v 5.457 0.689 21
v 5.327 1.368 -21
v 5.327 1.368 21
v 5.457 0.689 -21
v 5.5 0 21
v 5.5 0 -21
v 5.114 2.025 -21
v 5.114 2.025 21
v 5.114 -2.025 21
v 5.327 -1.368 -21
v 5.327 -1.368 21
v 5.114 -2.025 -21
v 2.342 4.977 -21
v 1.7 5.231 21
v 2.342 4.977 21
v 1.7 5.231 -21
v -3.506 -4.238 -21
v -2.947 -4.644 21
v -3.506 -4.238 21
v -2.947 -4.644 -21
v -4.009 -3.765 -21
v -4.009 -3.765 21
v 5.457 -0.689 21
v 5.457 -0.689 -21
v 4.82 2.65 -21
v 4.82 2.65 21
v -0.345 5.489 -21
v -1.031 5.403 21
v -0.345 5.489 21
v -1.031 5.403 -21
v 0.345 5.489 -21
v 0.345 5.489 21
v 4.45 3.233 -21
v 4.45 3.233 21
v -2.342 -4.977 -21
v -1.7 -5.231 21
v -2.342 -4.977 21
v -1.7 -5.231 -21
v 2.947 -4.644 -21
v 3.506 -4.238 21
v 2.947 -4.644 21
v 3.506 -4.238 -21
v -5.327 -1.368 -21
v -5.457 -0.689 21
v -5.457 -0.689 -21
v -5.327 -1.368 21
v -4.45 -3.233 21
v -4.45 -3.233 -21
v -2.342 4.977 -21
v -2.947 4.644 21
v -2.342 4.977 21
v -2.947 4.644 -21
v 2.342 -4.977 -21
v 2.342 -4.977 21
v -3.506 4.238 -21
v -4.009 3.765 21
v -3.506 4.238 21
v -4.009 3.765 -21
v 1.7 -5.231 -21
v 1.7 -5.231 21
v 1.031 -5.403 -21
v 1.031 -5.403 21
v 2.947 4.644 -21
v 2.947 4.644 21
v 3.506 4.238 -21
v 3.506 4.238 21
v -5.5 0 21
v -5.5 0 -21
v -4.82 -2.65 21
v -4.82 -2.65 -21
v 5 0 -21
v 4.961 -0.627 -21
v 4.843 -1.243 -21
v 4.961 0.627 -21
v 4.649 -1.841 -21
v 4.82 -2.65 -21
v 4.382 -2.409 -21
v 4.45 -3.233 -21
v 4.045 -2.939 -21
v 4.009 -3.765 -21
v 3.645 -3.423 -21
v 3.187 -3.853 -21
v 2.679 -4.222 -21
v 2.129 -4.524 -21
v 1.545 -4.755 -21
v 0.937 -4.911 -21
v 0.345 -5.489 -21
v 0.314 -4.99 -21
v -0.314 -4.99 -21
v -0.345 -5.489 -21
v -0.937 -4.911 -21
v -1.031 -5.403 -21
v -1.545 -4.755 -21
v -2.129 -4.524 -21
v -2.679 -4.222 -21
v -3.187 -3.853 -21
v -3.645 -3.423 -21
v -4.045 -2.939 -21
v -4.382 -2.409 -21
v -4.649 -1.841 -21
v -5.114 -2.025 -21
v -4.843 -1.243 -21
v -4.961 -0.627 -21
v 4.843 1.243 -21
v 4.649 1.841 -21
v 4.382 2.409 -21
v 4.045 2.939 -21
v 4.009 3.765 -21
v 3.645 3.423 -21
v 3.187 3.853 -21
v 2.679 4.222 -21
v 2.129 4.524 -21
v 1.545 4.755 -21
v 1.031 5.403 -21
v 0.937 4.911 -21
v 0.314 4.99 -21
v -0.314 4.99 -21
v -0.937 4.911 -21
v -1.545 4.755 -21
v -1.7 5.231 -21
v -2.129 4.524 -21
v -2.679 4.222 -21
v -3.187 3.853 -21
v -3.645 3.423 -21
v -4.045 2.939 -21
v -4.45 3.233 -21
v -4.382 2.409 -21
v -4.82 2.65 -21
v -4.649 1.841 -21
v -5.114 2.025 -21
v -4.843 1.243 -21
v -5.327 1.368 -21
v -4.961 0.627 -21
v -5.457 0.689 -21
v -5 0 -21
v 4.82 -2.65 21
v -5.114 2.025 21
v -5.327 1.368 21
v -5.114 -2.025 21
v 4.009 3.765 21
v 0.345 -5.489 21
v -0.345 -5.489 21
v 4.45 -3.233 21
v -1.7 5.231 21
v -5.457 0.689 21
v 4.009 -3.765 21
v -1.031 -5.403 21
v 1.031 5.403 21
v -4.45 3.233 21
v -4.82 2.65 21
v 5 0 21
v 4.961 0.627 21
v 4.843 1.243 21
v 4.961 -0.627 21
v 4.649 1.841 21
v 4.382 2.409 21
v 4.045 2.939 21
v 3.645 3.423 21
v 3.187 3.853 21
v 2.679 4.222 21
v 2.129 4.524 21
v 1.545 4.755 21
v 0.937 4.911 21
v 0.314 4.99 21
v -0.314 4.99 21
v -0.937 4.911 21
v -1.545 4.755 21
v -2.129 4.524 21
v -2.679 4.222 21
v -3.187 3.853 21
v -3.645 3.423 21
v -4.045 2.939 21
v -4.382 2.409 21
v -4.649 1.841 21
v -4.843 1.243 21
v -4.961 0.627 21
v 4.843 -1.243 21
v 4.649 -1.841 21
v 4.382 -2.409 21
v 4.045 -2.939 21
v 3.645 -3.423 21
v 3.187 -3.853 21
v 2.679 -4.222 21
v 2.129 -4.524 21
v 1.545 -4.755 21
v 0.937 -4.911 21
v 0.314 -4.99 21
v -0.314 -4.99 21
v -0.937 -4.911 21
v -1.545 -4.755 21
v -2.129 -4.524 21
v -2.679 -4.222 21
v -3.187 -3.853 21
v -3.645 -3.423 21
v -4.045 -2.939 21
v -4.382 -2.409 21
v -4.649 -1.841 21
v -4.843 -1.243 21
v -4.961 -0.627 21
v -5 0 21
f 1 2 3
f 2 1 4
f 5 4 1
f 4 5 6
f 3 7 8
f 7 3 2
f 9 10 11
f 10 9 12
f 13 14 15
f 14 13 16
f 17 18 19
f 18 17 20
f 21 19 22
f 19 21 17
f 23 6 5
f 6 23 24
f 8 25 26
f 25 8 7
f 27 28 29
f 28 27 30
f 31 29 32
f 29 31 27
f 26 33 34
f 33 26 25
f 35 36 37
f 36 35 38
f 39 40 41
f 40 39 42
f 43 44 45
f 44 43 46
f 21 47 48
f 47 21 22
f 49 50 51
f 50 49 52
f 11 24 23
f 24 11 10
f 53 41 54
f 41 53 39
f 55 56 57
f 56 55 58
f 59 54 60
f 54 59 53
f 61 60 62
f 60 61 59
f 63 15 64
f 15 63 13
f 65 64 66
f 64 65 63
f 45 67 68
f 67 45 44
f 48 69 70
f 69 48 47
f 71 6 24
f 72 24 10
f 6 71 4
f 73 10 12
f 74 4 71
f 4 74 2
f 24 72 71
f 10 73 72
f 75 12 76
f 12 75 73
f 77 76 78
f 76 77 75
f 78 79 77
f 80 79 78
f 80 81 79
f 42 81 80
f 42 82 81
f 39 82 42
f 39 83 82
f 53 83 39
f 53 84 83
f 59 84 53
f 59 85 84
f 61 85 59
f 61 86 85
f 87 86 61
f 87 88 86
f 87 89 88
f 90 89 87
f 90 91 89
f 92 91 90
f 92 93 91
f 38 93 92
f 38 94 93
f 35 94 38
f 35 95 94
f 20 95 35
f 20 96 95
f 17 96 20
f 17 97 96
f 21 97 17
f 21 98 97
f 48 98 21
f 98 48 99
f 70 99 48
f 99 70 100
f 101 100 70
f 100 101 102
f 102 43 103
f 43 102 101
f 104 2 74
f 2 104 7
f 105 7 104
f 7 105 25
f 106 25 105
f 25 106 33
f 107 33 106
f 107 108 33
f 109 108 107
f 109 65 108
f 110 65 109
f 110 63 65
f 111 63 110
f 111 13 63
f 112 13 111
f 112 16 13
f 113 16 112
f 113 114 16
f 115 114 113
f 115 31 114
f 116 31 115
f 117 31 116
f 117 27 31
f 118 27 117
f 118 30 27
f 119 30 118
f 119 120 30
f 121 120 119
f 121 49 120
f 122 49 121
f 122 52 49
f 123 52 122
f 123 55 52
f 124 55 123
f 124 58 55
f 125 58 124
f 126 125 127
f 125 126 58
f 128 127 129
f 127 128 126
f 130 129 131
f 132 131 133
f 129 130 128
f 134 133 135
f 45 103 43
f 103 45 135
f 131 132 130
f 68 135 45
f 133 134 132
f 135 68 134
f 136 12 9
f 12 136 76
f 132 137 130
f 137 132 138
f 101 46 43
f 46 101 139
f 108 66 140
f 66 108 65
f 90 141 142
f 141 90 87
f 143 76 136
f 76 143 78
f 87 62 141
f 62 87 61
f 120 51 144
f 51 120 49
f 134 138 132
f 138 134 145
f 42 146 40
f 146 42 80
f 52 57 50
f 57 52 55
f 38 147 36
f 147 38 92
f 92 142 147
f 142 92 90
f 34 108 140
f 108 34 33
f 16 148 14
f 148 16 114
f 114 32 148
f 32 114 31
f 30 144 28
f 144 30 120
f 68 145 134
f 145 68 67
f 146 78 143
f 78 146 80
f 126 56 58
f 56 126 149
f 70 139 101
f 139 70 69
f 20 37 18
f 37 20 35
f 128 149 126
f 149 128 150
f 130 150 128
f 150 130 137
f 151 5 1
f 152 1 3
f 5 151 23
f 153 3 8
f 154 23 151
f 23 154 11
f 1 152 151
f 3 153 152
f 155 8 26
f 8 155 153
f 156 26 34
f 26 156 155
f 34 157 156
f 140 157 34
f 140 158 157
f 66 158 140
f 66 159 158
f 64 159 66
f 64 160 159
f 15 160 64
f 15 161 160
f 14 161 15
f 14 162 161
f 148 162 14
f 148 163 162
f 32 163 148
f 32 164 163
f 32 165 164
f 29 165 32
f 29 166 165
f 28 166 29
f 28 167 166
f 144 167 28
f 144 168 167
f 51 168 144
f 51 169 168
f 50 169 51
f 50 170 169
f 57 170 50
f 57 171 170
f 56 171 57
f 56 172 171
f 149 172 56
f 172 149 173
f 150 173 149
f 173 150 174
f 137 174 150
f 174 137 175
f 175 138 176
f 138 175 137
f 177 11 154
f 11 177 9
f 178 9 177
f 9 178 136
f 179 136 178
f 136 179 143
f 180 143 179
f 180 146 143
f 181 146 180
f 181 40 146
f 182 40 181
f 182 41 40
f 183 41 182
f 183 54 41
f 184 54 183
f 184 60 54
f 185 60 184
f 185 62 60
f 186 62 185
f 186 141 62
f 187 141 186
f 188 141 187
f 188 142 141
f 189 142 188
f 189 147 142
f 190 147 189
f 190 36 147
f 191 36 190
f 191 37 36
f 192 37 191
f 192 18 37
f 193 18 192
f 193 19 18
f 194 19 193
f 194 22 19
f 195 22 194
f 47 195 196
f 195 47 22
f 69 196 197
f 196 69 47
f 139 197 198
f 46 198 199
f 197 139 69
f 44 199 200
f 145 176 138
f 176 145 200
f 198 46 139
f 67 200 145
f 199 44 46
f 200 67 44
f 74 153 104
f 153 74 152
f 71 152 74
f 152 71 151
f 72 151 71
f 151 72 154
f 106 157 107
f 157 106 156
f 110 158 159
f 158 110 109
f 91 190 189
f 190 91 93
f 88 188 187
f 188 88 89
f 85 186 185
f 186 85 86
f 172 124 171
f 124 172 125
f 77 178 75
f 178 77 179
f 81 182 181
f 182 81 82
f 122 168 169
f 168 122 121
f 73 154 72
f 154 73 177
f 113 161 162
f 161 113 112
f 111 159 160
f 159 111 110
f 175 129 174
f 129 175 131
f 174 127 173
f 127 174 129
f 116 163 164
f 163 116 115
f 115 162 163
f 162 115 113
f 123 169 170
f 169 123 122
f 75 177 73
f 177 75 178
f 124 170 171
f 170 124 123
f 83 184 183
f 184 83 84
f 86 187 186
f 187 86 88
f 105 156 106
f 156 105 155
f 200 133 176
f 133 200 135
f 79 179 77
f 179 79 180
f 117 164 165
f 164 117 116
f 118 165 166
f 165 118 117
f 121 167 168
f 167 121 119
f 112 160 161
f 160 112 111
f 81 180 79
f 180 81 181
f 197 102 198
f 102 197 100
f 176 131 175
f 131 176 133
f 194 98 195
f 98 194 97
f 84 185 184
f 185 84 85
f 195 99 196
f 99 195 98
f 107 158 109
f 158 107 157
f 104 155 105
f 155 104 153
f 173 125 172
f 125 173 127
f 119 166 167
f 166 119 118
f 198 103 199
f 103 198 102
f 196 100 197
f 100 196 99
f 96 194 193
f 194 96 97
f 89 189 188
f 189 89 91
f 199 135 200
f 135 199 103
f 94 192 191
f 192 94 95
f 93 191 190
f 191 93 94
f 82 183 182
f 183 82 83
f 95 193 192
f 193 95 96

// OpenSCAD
$fn = 50;


difference() {
	union() {
		translate(v = [0, 0, -21.0000000000]) {
			cylinder(h = 42, r = 5.5000000000);
		}
	}
	union() {
		translate(v = [0, 0, -100.0000000000]) {
			cylinder(h = 200, r = 5.0000000000);
		}
	}
}
